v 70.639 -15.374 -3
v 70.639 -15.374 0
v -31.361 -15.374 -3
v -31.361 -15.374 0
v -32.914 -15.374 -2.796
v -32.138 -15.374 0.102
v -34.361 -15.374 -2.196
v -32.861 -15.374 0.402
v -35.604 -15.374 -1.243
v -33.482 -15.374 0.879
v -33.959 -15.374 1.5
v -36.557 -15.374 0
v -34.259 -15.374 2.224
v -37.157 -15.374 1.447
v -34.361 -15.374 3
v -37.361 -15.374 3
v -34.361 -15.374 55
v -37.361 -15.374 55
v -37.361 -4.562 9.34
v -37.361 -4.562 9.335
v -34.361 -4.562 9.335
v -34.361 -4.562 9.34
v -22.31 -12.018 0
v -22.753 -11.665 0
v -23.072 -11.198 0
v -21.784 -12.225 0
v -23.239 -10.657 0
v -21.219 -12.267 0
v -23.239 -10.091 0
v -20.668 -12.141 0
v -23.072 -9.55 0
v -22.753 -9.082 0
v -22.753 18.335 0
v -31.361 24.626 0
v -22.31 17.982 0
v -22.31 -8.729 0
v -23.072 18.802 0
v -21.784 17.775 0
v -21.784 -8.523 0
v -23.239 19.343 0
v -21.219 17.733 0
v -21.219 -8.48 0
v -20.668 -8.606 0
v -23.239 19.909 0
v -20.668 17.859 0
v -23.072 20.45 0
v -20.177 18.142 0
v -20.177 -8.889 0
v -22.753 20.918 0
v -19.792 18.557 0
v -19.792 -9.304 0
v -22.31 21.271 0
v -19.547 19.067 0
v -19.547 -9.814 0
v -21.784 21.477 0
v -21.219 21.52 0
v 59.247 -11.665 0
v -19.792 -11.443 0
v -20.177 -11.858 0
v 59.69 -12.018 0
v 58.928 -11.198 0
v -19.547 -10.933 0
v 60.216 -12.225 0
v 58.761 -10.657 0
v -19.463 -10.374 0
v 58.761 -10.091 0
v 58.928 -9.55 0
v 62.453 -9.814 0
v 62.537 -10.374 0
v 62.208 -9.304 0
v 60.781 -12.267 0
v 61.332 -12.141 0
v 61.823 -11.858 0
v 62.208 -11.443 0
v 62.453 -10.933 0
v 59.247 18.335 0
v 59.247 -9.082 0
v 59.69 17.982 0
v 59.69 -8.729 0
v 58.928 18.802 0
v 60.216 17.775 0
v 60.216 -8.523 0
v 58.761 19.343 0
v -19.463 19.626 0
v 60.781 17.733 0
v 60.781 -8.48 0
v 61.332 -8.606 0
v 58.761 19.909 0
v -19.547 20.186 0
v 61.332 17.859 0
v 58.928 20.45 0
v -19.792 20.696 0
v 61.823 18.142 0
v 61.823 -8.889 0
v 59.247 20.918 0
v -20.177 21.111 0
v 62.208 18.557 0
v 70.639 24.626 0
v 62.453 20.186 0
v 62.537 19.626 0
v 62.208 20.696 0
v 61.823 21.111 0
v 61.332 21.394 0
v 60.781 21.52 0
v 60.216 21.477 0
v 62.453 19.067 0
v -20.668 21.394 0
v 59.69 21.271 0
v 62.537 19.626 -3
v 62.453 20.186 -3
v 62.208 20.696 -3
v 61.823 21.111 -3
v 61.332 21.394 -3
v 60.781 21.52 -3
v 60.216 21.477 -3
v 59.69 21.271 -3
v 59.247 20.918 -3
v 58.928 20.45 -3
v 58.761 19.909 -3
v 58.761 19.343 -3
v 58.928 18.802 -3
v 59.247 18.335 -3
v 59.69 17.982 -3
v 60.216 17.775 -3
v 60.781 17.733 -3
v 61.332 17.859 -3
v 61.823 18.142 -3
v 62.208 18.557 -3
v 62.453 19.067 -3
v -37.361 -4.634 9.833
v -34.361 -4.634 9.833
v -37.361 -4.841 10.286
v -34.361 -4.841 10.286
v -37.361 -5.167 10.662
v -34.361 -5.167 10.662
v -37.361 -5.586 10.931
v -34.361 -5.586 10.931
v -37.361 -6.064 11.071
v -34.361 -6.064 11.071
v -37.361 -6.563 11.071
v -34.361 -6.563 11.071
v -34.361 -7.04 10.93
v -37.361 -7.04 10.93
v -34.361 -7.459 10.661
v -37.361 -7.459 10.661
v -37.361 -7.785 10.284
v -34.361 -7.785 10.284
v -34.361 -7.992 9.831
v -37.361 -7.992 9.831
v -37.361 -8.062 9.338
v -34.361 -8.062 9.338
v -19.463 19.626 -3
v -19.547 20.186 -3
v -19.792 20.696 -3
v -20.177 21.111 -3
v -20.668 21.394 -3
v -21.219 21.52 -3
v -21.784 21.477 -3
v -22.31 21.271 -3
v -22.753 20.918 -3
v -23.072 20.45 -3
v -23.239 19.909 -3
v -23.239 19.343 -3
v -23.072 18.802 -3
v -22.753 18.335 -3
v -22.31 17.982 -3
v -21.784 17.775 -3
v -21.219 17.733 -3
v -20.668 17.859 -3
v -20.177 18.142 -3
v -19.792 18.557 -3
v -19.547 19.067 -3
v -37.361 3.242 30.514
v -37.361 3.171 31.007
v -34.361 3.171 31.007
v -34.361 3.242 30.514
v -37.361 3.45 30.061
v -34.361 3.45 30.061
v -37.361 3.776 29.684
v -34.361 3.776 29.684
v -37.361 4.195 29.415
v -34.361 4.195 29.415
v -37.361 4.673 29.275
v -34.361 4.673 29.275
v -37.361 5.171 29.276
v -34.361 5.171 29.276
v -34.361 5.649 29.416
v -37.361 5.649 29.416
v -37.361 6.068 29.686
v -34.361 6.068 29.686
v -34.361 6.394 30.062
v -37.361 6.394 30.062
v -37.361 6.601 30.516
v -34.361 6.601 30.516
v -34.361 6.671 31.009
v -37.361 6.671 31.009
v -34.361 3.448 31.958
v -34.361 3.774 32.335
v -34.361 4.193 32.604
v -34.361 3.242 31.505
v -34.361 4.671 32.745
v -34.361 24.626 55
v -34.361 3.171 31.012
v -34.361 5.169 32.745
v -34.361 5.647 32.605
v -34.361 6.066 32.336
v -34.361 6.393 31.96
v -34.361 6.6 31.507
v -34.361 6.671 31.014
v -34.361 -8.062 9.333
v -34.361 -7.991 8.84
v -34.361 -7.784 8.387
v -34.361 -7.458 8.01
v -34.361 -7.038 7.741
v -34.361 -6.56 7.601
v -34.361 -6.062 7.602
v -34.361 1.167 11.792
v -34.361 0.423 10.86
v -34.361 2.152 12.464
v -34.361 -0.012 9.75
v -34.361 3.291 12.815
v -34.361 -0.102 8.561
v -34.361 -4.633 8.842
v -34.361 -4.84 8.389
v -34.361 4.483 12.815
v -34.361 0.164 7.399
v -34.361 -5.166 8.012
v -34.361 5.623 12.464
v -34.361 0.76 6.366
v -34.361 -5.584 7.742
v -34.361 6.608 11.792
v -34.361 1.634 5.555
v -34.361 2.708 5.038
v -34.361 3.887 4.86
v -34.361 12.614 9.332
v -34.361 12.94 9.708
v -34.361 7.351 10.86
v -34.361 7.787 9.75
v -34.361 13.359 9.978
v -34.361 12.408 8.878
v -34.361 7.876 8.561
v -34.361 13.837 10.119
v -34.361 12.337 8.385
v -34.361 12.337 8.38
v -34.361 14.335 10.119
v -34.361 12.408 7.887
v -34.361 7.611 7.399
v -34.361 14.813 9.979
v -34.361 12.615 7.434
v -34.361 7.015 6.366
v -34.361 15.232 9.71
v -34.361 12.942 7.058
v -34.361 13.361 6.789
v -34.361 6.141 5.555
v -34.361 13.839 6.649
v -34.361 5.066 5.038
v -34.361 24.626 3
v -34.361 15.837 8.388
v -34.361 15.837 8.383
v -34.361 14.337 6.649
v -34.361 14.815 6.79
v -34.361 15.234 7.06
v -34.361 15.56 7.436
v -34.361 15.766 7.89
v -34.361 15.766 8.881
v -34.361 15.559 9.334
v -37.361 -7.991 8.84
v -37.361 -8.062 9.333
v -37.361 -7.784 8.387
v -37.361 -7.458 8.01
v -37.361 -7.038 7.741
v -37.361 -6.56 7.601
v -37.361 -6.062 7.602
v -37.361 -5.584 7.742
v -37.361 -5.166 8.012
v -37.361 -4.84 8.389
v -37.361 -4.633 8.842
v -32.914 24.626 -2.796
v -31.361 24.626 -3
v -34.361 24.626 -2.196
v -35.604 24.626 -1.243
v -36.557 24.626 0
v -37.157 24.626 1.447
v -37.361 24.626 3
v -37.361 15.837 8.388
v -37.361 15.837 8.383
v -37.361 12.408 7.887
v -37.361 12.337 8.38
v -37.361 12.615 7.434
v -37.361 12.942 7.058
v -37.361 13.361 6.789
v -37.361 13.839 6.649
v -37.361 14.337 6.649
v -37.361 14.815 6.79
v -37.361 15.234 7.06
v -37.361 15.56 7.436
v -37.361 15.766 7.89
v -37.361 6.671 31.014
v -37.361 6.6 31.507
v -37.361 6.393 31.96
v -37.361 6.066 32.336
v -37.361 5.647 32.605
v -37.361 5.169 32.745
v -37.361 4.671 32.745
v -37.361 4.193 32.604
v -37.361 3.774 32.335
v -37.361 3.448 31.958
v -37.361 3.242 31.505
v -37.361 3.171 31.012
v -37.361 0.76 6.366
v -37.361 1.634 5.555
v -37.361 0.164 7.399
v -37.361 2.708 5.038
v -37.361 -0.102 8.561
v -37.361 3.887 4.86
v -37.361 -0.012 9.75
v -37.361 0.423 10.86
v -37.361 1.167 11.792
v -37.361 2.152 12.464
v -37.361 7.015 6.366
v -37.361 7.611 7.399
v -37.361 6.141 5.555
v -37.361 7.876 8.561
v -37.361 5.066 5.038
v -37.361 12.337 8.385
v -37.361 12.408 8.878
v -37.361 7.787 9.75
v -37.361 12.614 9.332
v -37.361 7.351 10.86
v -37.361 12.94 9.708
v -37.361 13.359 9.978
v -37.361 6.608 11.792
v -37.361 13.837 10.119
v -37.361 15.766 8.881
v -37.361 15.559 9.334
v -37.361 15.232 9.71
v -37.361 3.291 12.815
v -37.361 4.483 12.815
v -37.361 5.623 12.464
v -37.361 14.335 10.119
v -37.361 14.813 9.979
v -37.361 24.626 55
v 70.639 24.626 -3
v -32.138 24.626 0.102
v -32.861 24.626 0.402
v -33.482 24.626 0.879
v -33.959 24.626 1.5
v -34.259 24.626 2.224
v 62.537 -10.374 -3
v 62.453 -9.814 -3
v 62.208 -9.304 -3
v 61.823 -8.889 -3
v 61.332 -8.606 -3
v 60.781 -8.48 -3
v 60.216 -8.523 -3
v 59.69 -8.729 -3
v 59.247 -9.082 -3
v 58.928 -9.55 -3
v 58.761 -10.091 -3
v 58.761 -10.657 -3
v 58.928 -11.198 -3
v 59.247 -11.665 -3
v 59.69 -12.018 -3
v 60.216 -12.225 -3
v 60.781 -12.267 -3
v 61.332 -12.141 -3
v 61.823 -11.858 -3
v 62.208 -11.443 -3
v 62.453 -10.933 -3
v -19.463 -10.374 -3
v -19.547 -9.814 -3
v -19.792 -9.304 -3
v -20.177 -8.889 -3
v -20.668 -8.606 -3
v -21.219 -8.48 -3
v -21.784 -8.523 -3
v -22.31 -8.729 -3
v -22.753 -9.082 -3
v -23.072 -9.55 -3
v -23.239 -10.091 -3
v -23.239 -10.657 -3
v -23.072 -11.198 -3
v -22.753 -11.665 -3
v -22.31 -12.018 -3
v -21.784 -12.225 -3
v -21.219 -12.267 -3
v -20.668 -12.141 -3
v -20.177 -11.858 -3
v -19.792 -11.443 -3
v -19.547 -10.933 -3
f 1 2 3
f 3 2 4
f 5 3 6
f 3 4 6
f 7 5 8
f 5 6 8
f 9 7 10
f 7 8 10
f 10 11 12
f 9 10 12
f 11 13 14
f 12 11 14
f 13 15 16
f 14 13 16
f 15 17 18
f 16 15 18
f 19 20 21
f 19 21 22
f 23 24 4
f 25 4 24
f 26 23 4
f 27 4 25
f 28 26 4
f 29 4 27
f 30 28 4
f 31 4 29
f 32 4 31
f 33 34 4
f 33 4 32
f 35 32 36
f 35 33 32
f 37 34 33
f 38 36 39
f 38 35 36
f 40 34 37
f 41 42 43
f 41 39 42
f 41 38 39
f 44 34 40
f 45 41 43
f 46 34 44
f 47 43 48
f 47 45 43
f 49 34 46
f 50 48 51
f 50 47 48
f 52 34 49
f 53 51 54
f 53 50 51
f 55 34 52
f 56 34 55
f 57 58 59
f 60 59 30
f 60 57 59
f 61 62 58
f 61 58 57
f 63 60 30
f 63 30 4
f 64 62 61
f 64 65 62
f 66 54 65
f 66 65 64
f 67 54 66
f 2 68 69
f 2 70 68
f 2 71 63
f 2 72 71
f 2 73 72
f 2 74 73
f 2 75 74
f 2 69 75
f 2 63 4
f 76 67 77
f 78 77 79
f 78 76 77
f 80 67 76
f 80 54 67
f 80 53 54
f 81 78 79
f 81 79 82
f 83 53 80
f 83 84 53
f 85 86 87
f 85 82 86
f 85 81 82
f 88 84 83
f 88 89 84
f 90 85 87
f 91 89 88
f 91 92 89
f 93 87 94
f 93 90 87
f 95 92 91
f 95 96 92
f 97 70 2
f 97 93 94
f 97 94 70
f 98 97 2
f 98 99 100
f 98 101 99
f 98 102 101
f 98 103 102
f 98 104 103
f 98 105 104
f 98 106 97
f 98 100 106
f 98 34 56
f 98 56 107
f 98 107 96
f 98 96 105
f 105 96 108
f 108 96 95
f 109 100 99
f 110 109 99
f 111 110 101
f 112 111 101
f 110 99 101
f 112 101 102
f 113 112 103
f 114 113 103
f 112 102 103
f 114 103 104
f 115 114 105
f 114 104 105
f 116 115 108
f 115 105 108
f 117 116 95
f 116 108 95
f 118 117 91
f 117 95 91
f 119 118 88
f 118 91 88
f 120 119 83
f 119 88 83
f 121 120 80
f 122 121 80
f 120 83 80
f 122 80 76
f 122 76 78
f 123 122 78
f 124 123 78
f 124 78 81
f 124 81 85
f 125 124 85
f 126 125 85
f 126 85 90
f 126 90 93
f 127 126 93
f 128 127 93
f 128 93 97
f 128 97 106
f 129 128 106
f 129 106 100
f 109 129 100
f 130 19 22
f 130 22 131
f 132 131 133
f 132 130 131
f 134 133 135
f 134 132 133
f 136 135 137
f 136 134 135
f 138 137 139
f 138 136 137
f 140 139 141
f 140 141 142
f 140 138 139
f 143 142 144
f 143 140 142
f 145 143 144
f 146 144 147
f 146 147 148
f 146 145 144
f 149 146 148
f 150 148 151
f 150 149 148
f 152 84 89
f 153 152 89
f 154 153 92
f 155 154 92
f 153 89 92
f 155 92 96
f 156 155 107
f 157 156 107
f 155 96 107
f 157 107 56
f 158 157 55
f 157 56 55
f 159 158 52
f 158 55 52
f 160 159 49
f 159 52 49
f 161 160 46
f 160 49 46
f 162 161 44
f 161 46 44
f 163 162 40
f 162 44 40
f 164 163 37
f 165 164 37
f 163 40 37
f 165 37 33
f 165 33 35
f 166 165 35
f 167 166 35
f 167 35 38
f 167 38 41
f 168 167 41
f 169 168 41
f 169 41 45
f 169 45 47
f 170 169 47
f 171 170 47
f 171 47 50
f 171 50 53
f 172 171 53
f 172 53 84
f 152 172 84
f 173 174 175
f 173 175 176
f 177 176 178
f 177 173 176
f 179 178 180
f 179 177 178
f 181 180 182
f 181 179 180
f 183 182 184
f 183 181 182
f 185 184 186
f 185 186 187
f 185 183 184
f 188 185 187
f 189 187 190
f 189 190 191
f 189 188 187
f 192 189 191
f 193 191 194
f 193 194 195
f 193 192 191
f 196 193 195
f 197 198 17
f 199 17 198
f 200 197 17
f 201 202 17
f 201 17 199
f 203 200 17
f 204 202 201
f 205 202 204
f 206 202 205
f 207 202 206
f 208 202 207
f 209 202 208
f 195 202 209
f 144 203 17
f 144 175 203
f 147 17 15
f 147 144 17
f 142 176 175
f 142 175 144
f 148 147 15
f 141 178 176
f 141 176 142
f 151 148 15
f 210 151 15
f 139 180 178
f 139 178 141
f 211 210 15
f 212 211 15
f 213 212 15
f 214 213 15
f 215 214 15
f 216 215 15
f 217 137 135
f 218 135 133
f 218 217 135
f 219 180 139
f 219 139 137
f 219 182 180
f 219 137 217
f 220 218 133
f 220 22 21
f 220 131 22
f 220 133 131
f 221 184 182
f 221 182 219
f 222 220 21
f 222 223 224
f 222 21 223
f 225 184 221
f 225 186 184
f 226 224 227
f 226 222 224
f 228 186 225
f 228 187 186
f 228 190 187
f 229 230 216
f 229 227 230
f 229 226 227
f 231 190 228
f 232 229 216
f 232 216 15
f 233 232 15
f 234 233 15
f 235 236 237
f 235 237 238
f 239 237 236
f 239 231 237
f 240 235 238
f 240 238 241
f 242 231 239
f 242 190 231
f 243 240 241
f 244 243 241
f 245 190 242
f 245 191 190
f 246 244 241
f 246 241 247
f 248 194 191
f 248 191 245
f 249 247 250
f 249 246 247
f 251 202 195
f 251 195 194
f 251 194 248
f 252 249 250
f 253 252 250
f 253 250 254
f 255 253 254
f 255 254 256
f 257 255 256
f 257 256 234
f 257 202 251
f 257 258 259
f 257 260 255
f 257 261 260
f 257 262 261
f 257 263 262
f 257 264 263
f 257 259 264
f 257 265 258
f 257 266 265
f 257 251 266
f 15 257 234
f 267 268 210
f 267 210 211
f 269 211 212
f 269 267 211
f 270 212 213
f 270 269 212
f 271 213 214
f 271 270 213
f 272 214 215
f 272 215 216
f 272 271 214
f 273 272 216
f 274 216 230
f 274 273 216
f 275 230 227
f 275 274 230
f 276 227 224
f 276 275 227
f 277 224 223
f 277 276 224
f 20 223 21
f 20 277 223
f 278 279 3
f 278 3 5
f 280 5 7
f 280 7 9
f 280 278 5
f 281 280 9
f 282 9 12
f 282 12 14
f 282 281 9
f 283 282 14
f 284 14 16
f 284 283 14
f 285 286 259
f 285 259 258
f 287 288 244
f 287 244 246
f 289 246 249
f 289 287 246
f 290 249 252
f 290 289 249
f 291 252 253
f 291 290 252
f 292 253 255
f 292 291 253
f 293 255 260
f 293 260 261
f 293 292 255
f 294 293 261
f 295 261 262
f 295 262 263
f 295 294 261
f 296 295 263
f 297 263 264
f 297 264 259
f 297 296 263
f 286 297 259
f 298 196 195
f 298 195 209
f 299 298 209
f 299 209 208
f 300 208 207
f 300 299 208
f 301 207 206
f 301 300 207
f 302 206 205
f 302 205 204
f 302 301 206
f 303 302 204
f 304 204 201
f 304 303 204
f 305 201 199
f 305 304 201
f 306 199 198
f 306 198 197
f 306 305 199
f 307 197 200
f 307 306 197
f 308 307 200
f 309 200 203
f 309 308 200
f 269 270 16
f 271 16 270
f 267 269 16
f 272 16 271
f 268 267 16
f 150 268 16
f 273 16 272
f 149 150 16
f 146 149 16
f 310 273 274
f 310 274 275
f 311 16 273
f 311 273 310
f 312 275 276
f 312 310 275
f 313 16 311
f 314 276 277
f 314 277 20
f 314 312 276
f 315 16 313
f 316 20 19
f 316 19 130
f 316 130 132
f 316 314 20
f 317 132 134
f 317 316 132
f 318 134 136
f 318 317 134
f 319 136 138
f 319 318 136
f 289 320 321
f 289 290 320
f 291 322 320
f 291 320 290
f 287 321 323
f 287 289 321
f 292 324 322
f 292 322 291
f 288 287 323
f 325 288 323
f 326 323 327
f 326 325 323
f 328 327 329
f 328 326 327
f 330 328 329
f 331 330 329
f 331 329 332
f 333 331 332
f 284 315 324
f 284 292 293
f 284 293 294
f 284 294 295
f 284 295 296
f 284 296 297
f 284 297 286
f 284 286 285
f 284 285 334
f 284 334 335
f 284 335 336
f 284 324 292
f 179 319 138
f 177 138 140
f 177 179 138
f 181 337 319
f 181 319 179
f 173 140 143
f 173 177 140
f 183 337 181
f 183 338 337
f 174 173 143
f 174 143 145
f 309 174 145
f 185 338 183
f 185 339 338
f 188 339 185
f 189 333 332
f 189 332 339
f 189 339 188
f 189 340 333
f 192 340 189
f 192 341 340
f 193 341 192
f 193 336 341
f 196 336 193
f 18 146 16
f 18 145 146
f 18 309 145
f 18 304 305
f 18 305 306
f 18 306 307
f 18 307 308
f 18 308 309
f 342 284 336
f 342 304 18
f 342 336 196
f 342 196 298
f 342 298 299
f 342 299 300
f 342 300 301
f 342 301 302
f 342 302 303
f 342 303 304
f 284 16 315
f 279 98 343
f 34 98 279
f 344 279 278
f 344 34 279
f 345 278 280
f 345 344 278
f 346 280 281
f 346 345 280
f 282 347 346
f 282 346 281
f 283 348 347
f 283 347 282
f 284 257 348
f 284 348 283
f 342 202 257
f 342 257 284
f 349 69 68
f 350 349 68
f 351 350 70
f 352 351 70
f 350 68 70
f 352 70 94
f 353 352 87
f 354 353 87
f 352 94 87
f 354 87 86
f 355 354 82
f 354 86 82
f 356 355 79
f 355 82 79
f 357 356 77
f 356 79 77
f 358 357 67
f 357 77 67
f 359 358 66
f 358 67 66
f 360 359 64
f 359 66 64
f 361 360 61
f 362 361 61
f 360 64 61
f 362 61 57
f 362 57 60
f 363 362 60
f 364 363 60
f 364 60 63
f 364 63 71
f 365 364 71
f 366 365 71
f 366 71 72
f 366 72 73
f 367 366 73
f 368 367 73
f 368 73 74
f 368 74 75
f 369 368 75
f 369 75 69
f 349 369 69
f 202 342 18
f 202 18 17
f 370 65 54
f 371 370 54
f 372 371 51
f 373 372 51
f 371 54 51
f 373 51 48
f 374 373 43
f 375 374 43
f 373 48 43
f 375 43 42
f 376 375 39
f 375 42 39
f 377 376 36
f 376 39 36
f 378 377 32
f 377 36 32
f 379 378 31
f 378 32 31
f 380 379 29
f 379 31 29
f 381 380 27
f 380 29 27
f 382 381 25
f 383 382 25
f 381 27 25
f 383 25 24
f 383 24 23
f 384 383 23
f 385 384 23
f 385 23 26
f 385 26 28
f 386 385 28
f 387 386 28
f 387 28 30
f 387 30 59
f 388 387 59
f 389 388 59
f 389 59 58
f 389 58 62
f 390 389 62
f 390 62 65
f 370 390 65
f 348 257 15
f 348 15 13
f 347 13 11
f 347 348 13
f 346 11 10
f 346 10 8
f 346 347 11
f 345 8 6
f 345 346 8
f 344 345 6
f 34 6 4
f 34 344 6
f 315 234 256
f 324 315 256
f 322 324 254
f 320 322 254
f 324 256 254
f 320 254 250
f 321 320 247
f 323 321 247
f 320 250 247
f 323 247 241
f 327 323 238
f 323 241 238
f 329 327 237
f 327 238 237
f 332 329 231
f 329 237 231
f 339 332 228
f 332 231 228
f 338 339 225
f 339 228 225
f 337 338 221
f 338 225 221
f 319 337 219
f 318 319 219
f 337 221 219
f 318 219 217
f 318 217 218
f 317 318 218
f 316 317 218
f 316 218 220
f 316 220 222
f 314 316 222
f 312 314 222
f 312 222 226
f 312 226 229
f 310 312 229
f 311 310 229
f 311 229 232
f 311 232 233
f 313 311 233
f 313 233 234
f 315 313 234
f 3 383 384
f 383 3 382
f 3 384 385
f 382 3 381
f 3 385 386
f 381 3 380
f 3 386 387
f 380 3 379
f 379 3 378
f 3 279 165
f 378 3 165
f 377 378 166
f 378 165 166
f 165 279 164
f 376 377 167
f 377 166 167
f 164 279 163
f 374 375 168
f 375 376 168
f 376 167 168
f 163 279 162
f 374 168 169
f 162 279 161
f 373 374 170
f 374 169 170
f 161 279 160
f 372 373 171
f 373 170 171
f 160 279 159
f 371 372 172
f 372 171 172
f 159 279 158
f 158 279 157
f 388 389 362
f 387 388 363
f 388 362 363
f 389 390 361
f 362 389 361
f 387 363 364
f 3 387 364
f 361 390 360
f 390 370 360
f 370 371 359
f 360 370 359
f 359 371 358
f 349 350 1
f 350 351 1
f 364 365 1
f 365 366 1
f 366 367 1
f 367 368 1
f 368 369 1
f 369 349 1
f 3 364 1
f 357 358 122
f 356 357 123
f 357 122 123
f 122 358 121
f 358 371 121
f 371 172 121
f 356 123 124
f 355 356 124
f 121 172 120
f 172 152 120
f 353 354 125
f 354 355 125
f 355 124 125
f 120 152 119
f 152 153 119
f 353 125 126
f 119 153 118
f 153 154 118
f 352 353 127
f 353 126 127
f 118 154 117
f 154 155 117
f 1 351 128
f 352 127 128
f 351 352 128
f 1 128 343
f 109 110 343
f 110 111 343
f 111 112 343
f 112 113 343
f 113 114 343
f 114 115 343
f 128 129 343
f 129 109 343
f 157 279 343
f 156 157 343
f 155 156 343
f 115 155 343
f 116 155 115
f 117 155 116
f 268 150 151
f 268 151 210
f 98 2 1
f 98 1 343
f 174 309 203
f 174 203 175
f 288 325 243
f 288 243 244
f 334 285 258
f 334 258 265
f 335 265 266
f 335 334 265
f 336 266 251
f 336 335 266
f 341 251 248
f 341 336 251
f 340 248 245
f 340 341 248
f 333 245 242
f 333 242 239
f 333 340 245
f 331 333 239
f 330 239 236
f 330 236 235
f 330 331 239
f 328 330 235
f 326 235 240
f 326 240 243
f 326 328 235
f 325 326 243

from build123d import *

# Parameters (mm, degrees)
SKETCH1_W                    = 105
SKETCH1_H                    = 40
BASE_FLANGE1_DEPTH           = 3
EDGE_FLANGE1_STRIP_W         = 18
EDGE_FLANGE1_STRIP_H         = 3
EDGE_FLANGE1_STRIP_CUT_DEPTH = 40
EDGE_FLANGE1_DEPTH           = 40
F_25_0_1495_DIAMETER_SLOT1_D = 3.7973
F_3_0MM_START                = -37.361157767
F_3_0MM_DOWEL_SLOT1_DEPTH    = 3
F_3_0MM_DOWEL_SLOT2_D        = 8


# Read off the part's stored shape, not the designer's step: Ø3.0mm Dowel Slot1
# Sheet-metal steps are written as plain solids
with BuildPart() as part:
    # Sketch1 → Base-Flange1 (new body)
    with BuildSketch(Plane.XY):
        with Locations((18.138842233, 4.62628866)):
            Rectangle(SKETCH1_W, SKETCH1_H)
    extrude(amount=-BASE_FLANGE1_DEPTH)

    # Edge-Flange1 strip (across the edge) → Edge-Flange1 strip cut (cut)
    with BuildSketch(Plane(origin=(-34.361157767, 24.62628866, 0), x_dir=(1, 0, 0), z_dir=(0, -1, 0))):
        with Locations((-6, -1.5)):
            Rectangle(EDGE_FLANGE1_STRIP_W, EDGE_FLANGE1_STRIP_H)
    extrude(amount=EDGE_FLANGE1_STRIP_CUT_DEPTH, mode=Mode.SUBTRACT)

    # Edge-Flange1 section (across the edge) → Edge-Flange1 (add)
    with BuildSketch(Plane(origin=(-34.361157767, 24.62628866, 0), x_dir=(1, 0, 0), z_dir=(0, -1, 0))):
        with BuildLine():
            Line((-3, 3), (-3, 55))
            Line((-3, 55), (0, 55))
            Line((0, 55), (0, 3))
            ThreePointArc((0, 3), (0.878679656, 0.878679656), (3, 0))
            Line((3, 0), (3, -3))
            ThreePointArc((3, -3), (-1.242640687, -1.242640687), (-3, 3))
        make_face()
    extrude(amount=EDGE_FLANGE1_DEPTH)

    # #25 (0.1495) Diameter Slot1 (through all)
    with Locations(Plane(origin=(0, 0, -3), x_dir=(-1, 0, 0), z_dir=(0, 0, -1))):
        with Locations((-60.638842233, 19.62628866), (-60.638842233, -10.37371134), (21.361157767, -10.37371134), (21.361157767, 19.62628866)):
            Hole(F_25_0_1495_DIAMETER_SLOT1_D / 2)

    # Ø3.0mm Dowel Slot1 outline → Ø3.0mm Dowel Slot1 (cut)
    with BuildSketch(Plane.YZ.offset(F_3_0MM_START)):
        with BuildLine():
            Line((6.67117218, 31.008782935), (6.671169071, 31.013782934))
            ThreePointArc((6.671169071, 31.013782934), (4.920081294, 32.762694482), (3.171169747, 31.011606705))
            Line((3.171169747, 31.011606705), (3.171172856, 31.006606706))
            ThreePointArc((3.171172856, 31.006606706), (4.922260632, 29.257695159), (6.67117218, 31.008782935))
        make_face()
        with BuildLine():
            Line((-4.562452858, 9.334806586), (-4.562455966, 9.339806585))
            ThreePointArc((-4.562455966, 9.339806585), (-6.313543742, 11.088718132), (-8.06245529, 9.337630356))
            Line((-8.06245529, 9.337630356), (-8.062452181, 9.332630357))
            ThreePointArc((-8.062452181, 9.332630357), (-6.311364405, 7.583718809), (-4.562452858, 9.334806586))
        make_face()
        with BuildLine():
            Line((15.836935374, 8.38259529), (15.836932265, 8.387595289))
            ThreePointArc((15.836932265, 8.387595289), (14.085844489, 10.136506836), (12.336932941, 8.38541906))
            Line((12.336932941, 8.38541906), (12.33693605, 8.380419061))
            ThreePointArc((12.33693605, 8.380419061), (14.088023826, 6.631507514), (15.836935374, 8.38259529))
        make_face()
    extrude(amount=F_3_0MM_DOWEL_SLOT1_DEPTH, mode=Mode.SUBTRACT)

    # Ø3.0mm Dowel Slot2 (through all)
    with Locations(Plane.ZY.offset(37.361157767)):
        with Locations((8.860112823, 3.887240042)):
            Hole(F_3_0MM_DOWEL_SLOT2_D / 2)


solid = part.part
